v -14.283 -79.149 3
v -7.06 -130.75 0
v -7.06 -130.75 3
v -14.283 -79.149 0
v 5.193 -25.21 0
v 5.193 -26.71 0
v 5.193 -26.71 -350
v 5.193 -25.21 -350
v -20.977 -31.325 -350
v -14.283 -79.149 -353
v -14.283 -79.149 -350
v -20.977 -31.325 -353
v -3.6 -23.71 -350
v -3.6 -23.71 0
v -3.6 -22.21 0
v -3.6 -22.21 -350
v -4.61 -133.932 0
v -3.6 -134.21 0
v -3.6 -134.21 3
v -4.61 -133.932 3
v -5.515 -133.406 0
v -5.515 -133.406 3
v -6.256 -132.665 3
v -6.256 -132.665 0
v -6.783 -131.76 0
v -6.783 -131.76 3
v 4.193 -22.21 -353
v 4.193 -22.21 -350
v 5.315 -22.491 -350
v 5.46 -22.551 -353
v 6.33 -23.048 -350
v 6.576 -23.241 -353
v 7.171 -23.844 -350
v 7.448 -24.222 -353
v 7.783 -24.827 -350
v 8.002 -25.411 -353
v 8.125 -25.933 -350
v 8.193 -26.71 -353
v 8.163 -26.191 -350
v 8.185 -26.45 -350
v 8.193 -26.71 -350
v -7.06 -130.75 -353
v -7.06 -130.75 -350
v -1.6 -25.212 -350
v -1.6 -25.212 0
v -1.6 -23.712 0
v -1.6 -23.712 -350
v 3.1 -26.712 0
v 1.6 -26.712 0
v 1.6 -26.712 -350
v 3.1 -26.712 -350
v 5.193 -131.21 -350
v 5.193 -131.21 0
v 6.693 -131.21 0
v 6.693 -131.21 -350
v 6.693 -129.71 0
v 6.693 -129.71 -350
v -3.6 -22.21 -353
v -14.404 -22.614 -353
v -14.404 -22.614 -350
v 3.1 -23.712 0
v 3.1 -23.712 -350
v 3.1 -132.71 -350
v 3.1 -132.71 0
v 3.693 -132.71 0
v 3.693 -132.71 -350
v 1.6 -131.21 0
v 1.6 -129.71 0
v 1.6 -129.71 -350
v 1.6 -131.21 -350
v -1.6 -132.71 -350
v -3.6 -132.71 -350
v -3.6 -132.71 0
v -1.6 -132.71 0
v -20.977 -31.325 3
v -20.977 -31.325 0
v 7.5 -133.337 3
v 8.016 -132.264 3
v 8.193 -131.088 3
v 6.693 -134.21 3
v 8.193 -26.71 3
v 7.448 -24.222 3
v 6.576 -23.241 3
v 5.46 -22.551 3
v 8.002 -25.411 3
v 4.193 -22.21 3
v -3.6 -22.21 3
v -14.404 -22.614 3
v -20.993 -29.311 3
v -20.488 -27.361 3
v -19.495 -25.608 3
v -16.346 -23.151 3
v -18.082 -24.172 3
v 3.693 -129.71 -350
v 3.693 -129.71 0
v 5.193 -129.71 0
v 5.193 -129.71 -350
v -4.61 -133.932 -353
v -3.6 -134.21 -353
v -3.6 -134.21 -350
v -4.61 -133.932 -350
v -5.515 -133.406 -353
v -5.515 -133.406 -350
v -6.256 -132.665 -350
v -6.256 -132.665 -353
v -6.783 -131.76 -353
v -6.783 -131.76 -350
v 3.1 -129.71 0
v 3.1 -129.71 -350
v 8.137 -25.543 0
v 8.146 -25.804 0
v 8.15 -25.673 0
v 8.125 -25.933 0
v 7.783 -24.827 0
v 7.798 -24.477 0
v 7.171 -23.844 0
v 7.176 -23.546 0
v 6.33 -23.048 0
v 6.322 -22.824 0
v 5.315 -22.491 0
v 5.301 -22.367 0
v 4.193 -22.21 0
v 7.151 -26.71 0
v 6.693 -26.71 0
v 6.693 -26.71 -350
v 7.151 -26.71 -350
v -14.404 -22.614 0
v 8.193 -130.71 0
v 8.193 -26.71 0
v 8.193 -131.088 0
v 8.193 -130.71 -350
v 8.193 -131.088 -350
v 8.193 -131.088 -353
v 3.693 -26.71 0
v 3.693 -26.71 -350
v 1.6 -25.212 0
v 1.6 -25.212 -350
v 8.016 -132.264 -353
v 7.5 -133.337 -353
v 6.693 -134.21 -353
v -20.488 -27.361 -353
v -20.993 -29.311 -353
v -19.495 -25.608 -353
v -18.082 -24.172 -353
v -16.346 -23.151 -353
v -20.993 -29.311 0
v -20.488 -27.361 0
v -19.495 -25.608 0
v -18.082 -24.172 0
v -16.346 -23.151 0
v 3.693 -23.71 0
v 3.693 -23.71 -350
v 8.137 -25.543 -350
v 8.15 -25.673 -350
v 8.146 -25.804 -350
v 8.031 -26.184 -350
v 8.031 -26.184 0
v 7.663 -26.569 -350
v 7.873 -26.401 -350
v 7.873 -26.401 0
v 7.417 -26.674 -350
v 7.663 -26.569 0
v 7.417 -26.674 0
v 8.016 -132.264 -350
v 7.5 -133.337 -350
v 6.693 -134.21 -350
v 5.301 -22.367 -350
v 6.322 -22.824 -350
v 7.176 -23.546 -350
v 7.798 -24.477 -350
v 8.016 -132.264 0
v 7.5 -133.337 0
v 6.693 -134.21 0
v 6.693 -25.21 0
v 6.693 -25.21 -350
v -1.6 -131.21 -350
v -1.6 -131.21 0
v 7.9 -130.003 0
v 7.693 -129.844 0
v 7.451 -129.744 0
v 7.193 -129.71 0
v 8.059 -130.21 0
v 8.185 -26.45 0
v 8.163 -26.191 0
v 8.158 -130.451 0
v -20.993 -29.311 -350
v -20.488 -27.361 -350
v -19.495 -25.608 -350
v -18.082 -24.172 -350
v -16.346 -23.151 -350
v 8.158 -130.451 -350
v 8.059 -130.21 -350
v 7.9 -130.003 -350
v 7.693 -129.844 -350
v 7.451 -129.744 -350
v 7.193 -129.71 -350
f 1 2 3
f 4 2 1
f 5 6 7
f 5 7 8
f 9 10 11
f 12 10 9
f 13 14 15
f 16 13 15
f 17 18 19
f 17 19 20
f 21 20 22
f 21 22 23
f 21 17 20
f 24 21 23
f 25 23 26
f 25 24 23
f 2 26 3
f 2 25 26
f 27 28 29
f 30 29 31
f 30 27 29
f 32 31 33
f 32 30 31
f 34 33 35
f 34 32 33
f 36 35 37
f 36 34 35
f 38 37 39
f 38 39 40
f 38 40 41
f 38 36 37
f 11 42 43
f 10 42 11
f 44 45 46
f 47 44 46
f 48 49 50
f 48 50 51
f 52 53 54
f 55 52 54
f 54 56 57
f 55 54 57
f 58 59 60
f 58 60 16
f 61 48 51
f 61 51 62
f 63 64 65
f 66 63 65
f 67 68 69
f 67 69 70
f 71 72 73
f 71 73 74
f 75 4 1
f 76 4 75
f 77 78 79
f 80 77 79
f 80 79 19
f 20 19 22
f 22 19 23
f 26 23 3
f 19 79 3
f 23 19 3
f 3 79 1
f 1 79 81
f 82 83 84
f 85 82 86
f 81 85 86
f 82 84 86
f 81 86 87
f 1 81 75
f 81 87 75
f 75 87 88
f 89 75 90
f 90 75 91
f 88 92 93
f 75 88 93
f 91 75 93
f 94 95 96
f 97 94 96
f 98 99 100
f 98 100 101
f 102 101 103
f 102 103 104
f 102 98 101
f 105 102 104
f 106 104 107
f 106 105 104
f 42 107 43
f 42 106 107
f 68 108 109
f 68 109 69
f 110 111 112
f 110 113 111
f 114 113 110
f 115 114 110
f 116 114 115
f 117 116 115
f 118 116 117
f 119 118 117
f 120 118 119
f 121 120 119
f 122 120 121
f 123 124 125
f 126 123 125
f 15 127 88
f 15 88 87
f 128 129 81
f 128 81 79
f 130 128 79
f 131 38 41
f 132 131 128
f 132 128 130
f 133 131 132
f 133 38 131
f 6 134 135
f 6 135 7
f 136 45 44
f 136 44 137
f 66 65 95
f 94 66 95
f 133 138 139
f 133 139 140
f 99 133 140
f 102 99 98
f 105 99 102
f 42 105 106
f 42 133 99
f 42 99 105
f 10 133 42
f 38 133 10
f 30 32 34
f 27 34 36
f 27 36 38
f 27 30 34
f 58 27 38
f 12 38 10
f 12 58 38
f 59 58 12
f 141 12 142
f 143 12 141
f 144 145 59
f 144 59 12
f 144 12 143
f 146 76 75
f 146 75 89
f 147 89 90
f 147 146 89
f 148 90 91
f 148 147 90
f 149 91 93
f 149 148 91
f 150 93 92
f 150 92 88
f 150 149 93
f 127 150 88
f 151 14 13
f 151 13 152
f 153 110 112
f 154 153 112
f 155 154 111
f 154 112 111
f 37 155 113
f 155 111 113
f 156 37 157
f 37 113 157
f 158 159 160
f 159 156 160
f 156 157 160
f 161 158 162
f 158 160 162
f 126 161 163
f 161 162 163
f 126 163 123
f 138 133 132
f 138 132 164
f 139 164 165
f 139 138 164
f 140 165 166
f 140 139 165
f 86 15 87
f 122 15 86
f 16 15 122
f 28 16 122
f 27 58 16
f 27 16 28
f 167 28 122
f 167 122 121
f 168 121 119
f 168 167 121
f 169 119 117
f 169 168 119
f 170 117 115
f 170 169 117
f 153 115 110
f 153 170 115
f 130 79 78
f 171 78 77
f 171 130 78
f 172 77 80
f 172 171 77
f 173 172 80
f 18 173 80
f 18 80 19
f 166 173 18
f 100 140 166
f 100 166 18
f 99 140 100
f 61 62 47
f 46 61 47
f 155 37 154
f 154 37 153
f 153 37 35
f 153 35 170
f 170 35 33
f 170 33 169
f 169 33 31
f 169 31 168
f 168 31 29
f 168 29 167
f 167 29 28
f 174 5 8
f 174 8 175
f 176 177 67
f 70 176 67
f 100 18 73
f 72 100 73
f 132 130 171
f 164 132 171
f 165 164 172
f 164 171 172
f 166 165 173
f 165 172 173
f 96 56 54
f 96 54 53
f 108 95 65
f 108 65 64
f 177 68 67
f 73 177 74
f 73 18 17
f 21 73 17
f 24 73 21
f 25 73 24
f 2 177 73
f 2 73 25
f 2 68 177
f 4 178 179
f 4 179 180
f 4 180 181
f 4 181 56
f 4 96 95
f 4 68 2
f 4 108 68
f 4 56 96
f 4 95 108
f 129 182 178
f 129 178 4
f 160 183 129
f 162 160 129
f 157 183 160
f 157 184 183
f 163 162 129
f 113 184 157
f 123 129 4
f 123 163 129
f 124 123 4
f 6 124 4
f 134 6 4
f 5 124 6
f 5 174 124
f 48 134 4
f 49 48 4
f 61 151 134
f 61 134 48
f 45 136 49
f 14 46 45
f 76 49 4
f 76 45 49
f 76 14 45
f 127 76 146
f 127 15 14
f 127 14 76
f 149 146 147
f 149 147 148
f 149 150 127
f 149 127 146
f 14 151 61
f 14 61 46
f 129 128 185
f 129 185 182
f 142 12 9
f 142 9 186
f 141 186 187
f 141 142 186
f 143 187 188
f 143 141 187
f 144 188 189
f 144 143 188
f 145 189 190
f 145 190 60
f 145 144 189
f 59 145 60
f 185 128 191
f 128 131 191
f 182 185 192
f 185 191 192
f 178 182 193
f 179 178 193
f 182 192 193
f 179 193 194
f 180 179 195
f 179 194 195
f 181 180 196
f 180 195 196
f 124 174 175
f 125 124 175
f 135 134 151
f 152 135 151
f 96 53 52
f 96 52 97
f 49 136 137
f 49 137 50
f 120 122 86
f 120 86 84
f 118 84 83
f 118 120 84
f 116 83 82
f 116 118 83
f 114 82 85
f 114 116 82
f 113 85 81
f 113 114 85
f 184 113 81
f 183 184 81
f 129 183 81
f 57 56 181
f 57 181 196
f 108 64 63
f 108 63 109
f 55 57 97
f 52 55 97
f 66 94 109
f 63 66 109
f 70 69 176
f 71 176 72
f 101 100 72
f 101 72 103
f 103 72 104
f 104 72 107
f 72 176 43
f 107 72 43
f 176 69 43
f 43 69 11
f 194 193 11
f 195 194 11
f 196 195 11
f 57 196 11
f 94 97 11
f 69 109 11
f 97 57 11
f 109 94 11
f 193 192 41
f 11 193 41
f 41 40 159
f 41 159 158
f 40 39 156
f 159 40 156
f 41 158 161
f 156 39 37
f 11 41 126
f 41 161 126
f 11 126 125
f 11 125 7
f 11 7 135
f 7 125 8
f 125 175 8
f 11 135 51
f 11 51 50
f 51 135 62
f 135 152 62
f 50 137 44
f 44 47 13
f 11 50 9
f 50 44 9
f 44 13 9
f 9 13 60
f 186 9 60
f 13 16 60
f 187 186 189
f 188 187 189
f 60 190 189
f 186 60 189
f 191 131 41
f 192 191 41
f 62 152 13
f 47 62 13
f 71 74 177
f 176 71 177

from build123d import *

# Parameters (mm, degrees)
RAIL_W                    = 3.2
RAIL_H                    = 1.5
RAIL_W_2                  = 1.5
RAIL_H_2                  = 3
RAIL_W_3                  = 10.292519685
BOSS_EXTRUDE1_DEPTH       = 350
BOSS_EXTRUDE2_OUTLINE_W   = 350
BOSS_EXTRUDE2_OUTLINE_H   = 4.5
BOSS_EXTRUDE2_DEPTH       = 1.5
BOSS_EXTRUDE2_2_OUTLINE_W = 350
BOSS_EXTRUDE2_2_OUTLINE_H = 4.5
BOSS_EXTRUDE2_2_DEPTH     = 1.5
FILLET1_R                 = 4
FILLET2_R                 = 4
BOSS_EXTRUDE3_DEPTH       = 3
FILLET3_R                 = 1
FILLET4_R                 = 1
LPATTERN1_COUNT           = 2
LPATTERN1_PITCH           = 353


# Read off the part's stored shape, not the designer's step: Boss-Extrude2
with BuildPart() as part:
    # rail → Boss-Extrude1 (new body)
    with BuildSketch(Plane.XY):
        with Locations((0, -24.462398)):
            Rectangle(RAIL_W, RAIL_H)
        Polygon((1.6, -23.712398), (1.6, -25.212398), (1.6, -26.712398), (3.1, -26.712398), (3.1, -23.712398), align=None)
        with Locations((4.442519685, -25.21)):
            Rectangle(RAIL_W_2, RAIL_H_2)
        with Locations((5.942519685, -24.46)):
            Rectangle(RAIL_W_2, RAIL_H)
        with Locations((5.942519685, -131.96)):
            Rectangle(RAIL_W_2, RAIL_H)
        with Locations((4.442519685, -131.21)):
            Rectangle(RAIL_W_2, RAIL_H_2)
        Polygon((1.6, -129.710002609), (1.6, -131.210002609), (1.6, -132.710002609), (3.1, -132.710002609), (3.1, -129.710002609), align=None)
        with Locations((0, -131.960002609)):
            Rectangle(RAIL_W, RAIL_H)
        with Locations((1.546259843, -22.96)):
            Rectangle(RAIL_W_3, RAIL_H)
        with Locations((1.546259843, -133.46)):
            Rectangle(RAIL_W_3, RAIL_H)
    extrude(amount=-BOSS_EXTRUDE1_DEPTH)

    # Boss-Extrude2 outline → Boss-Extrude2 (add)
    with BuildSketch(Plane(origin=(6.692519685, 0, 0), x_dir=(0, 0, -1), z_dir=(1, 0, 0))):
        with Locations((175, -24.46)):
            Rectangle(BOSS_EXTRUDE2_OUTLINE_W, BOSS_EXTRUDE2_OUTLINE_H)
    extrude(amount=BOSS_EXTRUDE2_DEPTH)

    # Fillet1
    fillet1_edges = [part.edges().sort_by_distance(p)[0] for p in [
        (8.192519685, -22.21, -175),
    ]]
    fillet(fillet1_edges, radius=FILLET1_R)



with BuildPart() as body_2:
    # Boss-Extrude2 2 outline → Boss-Extrude2 2 (new body)
    with BuildSketch(Plane(origin=(6.692519685, 0, 0), x_dir=(0, 0, -1), z_dir=(1, 0, 0))):
        with Locations((175, -131.96)):
            Rectangle(BOSS_EXTRUDE2_2_OUTLINE_W, BOSS_EXTRUDE2_2_OUTLINE_H)
    extrude(amount=BOSS_EXTRUDE2_2_DEPTH)

    # Fillet2
    # the kernel refuses this fillet: 4 mm, written as the material it takes off along each edge
    with BuildSketch(Plane(origin=(8.192519685, -134.21, 7.806247498), x_dir=(-1, 0, 0), z_dir=(0, 0, -1))) as fillet2_piece_1:
        with BuildLine():
            CenterArc((4, 3.122498999), FILLET2_R, 180, 51.317812547)
            Line((0, 3.122498999), (-0.08, 3.122498999))
            Line((-0.08, 3.122498999), (-0.08, 0))
            Line((-0.08, 0), (0, -0.08))
            ThreePointArc((0, -0.08), (0.75, -0.08), (1.45, -0.06244998))
            Line((1.45, -0.06244998), (1.5, 0))
        make_face()
    extrude(amount=365.612494996, mode=Mode.SUBTRACT)


with BuildPart() as part_1:
    add(part.part)

    add(body_2.part)  # Boss-Extrude3 merges body 2
    # side → Boss-Extrude3 (add)
    with BuildSketch(Plane.XY):
        with BuildLine():
            Line((8.192519685, -26.71), (8.192519685, -129.71))
            Line((8.192519685, -129.71), (8.192519685, -131.087501001))
            ThreePointArc((8.192519685, -131.087501001), (7.798070961, -132.819551808), (6.692519685, -134.21))
            Line((6.692519685, -134.21), (-3.6, -134.21))
            ThreePointArc((-3.6, -134.21), (-5.909675728, -133.059247145), (-7.060428583, -130.749571417))
            Line((-7.060428583, -130.749571417), (-14.282896215, -79.148969011))
            Line((-14.282896215, -79.148969011), (-20.976742465, -31.325078818))
            ThreePointArc((-20.976742465, -31.325078818), (-19.494827467, -25.608174313), (-14.404493379, -22.613584515))
            Line((-14.404493379, -22.613584515), (-3.6, -22.21))
            Line((-3.6, -22.21), (4.192519685, -22.21))
            ThreePointArc((4.192519685, -22.21), (7.04796816, -23.699601355), (8.192519685, -26.71))
        make_face()
    boss_extrude3 = extrude(amount=BOSS_EXTRUDE3_DEPTH)

    # Fillet3
    fillet3_edges = [part_1.edges().sort_by_distance(p)[0] for p in [
        (8.192519685, -129.71, -175),
    ]]
    fillet(fillet3_edges, radius=FILLET3_R)

    # Fillet4
    # the kernel refuses this fillet: 1 mm, written as the material it takes off along each edge
    with BuildSketch(Plane(origin=(8.192519685, -26.71, 0), x_dir=(-0.047899365984683646, 0.9988521666083853, 0), z_dir=(0, 0, -1))) as fillet4_piece_1:
        with BuildLine():
            CenterArc((1.048761395, -0.992864746), FILLET4_R, 83.151413818, 99.594068227)
            Line((0.049909229, -1.040764112), (-0.049975988, -1.045554048))
            Line((-0.049975988, -1.045554048), (-0.099885217, -0.004789937))
            Line((-0.099885217, -0.004789937), (-0.004789937, 0.099885217))
            ThreePointArc((-0.004789937, 0.099885217), (0.494636147, 0.1238349), (1.179931939, 0.099286475))
            Line((1.179931939, 0.099286475), (1.168007344, 0))
        make_face()
    extrude(amount=352.920018361, mode=Mode.SUBTRACT)

    # LPattern1: Boss-Extrude3 ×2
    with Locations(*[(0, 0, -i * LPATTERN1_PITCH) for i in range(1, LPATTERN1_COUNT)]):
        add(boss_extrude3)


solid = part_1.part
